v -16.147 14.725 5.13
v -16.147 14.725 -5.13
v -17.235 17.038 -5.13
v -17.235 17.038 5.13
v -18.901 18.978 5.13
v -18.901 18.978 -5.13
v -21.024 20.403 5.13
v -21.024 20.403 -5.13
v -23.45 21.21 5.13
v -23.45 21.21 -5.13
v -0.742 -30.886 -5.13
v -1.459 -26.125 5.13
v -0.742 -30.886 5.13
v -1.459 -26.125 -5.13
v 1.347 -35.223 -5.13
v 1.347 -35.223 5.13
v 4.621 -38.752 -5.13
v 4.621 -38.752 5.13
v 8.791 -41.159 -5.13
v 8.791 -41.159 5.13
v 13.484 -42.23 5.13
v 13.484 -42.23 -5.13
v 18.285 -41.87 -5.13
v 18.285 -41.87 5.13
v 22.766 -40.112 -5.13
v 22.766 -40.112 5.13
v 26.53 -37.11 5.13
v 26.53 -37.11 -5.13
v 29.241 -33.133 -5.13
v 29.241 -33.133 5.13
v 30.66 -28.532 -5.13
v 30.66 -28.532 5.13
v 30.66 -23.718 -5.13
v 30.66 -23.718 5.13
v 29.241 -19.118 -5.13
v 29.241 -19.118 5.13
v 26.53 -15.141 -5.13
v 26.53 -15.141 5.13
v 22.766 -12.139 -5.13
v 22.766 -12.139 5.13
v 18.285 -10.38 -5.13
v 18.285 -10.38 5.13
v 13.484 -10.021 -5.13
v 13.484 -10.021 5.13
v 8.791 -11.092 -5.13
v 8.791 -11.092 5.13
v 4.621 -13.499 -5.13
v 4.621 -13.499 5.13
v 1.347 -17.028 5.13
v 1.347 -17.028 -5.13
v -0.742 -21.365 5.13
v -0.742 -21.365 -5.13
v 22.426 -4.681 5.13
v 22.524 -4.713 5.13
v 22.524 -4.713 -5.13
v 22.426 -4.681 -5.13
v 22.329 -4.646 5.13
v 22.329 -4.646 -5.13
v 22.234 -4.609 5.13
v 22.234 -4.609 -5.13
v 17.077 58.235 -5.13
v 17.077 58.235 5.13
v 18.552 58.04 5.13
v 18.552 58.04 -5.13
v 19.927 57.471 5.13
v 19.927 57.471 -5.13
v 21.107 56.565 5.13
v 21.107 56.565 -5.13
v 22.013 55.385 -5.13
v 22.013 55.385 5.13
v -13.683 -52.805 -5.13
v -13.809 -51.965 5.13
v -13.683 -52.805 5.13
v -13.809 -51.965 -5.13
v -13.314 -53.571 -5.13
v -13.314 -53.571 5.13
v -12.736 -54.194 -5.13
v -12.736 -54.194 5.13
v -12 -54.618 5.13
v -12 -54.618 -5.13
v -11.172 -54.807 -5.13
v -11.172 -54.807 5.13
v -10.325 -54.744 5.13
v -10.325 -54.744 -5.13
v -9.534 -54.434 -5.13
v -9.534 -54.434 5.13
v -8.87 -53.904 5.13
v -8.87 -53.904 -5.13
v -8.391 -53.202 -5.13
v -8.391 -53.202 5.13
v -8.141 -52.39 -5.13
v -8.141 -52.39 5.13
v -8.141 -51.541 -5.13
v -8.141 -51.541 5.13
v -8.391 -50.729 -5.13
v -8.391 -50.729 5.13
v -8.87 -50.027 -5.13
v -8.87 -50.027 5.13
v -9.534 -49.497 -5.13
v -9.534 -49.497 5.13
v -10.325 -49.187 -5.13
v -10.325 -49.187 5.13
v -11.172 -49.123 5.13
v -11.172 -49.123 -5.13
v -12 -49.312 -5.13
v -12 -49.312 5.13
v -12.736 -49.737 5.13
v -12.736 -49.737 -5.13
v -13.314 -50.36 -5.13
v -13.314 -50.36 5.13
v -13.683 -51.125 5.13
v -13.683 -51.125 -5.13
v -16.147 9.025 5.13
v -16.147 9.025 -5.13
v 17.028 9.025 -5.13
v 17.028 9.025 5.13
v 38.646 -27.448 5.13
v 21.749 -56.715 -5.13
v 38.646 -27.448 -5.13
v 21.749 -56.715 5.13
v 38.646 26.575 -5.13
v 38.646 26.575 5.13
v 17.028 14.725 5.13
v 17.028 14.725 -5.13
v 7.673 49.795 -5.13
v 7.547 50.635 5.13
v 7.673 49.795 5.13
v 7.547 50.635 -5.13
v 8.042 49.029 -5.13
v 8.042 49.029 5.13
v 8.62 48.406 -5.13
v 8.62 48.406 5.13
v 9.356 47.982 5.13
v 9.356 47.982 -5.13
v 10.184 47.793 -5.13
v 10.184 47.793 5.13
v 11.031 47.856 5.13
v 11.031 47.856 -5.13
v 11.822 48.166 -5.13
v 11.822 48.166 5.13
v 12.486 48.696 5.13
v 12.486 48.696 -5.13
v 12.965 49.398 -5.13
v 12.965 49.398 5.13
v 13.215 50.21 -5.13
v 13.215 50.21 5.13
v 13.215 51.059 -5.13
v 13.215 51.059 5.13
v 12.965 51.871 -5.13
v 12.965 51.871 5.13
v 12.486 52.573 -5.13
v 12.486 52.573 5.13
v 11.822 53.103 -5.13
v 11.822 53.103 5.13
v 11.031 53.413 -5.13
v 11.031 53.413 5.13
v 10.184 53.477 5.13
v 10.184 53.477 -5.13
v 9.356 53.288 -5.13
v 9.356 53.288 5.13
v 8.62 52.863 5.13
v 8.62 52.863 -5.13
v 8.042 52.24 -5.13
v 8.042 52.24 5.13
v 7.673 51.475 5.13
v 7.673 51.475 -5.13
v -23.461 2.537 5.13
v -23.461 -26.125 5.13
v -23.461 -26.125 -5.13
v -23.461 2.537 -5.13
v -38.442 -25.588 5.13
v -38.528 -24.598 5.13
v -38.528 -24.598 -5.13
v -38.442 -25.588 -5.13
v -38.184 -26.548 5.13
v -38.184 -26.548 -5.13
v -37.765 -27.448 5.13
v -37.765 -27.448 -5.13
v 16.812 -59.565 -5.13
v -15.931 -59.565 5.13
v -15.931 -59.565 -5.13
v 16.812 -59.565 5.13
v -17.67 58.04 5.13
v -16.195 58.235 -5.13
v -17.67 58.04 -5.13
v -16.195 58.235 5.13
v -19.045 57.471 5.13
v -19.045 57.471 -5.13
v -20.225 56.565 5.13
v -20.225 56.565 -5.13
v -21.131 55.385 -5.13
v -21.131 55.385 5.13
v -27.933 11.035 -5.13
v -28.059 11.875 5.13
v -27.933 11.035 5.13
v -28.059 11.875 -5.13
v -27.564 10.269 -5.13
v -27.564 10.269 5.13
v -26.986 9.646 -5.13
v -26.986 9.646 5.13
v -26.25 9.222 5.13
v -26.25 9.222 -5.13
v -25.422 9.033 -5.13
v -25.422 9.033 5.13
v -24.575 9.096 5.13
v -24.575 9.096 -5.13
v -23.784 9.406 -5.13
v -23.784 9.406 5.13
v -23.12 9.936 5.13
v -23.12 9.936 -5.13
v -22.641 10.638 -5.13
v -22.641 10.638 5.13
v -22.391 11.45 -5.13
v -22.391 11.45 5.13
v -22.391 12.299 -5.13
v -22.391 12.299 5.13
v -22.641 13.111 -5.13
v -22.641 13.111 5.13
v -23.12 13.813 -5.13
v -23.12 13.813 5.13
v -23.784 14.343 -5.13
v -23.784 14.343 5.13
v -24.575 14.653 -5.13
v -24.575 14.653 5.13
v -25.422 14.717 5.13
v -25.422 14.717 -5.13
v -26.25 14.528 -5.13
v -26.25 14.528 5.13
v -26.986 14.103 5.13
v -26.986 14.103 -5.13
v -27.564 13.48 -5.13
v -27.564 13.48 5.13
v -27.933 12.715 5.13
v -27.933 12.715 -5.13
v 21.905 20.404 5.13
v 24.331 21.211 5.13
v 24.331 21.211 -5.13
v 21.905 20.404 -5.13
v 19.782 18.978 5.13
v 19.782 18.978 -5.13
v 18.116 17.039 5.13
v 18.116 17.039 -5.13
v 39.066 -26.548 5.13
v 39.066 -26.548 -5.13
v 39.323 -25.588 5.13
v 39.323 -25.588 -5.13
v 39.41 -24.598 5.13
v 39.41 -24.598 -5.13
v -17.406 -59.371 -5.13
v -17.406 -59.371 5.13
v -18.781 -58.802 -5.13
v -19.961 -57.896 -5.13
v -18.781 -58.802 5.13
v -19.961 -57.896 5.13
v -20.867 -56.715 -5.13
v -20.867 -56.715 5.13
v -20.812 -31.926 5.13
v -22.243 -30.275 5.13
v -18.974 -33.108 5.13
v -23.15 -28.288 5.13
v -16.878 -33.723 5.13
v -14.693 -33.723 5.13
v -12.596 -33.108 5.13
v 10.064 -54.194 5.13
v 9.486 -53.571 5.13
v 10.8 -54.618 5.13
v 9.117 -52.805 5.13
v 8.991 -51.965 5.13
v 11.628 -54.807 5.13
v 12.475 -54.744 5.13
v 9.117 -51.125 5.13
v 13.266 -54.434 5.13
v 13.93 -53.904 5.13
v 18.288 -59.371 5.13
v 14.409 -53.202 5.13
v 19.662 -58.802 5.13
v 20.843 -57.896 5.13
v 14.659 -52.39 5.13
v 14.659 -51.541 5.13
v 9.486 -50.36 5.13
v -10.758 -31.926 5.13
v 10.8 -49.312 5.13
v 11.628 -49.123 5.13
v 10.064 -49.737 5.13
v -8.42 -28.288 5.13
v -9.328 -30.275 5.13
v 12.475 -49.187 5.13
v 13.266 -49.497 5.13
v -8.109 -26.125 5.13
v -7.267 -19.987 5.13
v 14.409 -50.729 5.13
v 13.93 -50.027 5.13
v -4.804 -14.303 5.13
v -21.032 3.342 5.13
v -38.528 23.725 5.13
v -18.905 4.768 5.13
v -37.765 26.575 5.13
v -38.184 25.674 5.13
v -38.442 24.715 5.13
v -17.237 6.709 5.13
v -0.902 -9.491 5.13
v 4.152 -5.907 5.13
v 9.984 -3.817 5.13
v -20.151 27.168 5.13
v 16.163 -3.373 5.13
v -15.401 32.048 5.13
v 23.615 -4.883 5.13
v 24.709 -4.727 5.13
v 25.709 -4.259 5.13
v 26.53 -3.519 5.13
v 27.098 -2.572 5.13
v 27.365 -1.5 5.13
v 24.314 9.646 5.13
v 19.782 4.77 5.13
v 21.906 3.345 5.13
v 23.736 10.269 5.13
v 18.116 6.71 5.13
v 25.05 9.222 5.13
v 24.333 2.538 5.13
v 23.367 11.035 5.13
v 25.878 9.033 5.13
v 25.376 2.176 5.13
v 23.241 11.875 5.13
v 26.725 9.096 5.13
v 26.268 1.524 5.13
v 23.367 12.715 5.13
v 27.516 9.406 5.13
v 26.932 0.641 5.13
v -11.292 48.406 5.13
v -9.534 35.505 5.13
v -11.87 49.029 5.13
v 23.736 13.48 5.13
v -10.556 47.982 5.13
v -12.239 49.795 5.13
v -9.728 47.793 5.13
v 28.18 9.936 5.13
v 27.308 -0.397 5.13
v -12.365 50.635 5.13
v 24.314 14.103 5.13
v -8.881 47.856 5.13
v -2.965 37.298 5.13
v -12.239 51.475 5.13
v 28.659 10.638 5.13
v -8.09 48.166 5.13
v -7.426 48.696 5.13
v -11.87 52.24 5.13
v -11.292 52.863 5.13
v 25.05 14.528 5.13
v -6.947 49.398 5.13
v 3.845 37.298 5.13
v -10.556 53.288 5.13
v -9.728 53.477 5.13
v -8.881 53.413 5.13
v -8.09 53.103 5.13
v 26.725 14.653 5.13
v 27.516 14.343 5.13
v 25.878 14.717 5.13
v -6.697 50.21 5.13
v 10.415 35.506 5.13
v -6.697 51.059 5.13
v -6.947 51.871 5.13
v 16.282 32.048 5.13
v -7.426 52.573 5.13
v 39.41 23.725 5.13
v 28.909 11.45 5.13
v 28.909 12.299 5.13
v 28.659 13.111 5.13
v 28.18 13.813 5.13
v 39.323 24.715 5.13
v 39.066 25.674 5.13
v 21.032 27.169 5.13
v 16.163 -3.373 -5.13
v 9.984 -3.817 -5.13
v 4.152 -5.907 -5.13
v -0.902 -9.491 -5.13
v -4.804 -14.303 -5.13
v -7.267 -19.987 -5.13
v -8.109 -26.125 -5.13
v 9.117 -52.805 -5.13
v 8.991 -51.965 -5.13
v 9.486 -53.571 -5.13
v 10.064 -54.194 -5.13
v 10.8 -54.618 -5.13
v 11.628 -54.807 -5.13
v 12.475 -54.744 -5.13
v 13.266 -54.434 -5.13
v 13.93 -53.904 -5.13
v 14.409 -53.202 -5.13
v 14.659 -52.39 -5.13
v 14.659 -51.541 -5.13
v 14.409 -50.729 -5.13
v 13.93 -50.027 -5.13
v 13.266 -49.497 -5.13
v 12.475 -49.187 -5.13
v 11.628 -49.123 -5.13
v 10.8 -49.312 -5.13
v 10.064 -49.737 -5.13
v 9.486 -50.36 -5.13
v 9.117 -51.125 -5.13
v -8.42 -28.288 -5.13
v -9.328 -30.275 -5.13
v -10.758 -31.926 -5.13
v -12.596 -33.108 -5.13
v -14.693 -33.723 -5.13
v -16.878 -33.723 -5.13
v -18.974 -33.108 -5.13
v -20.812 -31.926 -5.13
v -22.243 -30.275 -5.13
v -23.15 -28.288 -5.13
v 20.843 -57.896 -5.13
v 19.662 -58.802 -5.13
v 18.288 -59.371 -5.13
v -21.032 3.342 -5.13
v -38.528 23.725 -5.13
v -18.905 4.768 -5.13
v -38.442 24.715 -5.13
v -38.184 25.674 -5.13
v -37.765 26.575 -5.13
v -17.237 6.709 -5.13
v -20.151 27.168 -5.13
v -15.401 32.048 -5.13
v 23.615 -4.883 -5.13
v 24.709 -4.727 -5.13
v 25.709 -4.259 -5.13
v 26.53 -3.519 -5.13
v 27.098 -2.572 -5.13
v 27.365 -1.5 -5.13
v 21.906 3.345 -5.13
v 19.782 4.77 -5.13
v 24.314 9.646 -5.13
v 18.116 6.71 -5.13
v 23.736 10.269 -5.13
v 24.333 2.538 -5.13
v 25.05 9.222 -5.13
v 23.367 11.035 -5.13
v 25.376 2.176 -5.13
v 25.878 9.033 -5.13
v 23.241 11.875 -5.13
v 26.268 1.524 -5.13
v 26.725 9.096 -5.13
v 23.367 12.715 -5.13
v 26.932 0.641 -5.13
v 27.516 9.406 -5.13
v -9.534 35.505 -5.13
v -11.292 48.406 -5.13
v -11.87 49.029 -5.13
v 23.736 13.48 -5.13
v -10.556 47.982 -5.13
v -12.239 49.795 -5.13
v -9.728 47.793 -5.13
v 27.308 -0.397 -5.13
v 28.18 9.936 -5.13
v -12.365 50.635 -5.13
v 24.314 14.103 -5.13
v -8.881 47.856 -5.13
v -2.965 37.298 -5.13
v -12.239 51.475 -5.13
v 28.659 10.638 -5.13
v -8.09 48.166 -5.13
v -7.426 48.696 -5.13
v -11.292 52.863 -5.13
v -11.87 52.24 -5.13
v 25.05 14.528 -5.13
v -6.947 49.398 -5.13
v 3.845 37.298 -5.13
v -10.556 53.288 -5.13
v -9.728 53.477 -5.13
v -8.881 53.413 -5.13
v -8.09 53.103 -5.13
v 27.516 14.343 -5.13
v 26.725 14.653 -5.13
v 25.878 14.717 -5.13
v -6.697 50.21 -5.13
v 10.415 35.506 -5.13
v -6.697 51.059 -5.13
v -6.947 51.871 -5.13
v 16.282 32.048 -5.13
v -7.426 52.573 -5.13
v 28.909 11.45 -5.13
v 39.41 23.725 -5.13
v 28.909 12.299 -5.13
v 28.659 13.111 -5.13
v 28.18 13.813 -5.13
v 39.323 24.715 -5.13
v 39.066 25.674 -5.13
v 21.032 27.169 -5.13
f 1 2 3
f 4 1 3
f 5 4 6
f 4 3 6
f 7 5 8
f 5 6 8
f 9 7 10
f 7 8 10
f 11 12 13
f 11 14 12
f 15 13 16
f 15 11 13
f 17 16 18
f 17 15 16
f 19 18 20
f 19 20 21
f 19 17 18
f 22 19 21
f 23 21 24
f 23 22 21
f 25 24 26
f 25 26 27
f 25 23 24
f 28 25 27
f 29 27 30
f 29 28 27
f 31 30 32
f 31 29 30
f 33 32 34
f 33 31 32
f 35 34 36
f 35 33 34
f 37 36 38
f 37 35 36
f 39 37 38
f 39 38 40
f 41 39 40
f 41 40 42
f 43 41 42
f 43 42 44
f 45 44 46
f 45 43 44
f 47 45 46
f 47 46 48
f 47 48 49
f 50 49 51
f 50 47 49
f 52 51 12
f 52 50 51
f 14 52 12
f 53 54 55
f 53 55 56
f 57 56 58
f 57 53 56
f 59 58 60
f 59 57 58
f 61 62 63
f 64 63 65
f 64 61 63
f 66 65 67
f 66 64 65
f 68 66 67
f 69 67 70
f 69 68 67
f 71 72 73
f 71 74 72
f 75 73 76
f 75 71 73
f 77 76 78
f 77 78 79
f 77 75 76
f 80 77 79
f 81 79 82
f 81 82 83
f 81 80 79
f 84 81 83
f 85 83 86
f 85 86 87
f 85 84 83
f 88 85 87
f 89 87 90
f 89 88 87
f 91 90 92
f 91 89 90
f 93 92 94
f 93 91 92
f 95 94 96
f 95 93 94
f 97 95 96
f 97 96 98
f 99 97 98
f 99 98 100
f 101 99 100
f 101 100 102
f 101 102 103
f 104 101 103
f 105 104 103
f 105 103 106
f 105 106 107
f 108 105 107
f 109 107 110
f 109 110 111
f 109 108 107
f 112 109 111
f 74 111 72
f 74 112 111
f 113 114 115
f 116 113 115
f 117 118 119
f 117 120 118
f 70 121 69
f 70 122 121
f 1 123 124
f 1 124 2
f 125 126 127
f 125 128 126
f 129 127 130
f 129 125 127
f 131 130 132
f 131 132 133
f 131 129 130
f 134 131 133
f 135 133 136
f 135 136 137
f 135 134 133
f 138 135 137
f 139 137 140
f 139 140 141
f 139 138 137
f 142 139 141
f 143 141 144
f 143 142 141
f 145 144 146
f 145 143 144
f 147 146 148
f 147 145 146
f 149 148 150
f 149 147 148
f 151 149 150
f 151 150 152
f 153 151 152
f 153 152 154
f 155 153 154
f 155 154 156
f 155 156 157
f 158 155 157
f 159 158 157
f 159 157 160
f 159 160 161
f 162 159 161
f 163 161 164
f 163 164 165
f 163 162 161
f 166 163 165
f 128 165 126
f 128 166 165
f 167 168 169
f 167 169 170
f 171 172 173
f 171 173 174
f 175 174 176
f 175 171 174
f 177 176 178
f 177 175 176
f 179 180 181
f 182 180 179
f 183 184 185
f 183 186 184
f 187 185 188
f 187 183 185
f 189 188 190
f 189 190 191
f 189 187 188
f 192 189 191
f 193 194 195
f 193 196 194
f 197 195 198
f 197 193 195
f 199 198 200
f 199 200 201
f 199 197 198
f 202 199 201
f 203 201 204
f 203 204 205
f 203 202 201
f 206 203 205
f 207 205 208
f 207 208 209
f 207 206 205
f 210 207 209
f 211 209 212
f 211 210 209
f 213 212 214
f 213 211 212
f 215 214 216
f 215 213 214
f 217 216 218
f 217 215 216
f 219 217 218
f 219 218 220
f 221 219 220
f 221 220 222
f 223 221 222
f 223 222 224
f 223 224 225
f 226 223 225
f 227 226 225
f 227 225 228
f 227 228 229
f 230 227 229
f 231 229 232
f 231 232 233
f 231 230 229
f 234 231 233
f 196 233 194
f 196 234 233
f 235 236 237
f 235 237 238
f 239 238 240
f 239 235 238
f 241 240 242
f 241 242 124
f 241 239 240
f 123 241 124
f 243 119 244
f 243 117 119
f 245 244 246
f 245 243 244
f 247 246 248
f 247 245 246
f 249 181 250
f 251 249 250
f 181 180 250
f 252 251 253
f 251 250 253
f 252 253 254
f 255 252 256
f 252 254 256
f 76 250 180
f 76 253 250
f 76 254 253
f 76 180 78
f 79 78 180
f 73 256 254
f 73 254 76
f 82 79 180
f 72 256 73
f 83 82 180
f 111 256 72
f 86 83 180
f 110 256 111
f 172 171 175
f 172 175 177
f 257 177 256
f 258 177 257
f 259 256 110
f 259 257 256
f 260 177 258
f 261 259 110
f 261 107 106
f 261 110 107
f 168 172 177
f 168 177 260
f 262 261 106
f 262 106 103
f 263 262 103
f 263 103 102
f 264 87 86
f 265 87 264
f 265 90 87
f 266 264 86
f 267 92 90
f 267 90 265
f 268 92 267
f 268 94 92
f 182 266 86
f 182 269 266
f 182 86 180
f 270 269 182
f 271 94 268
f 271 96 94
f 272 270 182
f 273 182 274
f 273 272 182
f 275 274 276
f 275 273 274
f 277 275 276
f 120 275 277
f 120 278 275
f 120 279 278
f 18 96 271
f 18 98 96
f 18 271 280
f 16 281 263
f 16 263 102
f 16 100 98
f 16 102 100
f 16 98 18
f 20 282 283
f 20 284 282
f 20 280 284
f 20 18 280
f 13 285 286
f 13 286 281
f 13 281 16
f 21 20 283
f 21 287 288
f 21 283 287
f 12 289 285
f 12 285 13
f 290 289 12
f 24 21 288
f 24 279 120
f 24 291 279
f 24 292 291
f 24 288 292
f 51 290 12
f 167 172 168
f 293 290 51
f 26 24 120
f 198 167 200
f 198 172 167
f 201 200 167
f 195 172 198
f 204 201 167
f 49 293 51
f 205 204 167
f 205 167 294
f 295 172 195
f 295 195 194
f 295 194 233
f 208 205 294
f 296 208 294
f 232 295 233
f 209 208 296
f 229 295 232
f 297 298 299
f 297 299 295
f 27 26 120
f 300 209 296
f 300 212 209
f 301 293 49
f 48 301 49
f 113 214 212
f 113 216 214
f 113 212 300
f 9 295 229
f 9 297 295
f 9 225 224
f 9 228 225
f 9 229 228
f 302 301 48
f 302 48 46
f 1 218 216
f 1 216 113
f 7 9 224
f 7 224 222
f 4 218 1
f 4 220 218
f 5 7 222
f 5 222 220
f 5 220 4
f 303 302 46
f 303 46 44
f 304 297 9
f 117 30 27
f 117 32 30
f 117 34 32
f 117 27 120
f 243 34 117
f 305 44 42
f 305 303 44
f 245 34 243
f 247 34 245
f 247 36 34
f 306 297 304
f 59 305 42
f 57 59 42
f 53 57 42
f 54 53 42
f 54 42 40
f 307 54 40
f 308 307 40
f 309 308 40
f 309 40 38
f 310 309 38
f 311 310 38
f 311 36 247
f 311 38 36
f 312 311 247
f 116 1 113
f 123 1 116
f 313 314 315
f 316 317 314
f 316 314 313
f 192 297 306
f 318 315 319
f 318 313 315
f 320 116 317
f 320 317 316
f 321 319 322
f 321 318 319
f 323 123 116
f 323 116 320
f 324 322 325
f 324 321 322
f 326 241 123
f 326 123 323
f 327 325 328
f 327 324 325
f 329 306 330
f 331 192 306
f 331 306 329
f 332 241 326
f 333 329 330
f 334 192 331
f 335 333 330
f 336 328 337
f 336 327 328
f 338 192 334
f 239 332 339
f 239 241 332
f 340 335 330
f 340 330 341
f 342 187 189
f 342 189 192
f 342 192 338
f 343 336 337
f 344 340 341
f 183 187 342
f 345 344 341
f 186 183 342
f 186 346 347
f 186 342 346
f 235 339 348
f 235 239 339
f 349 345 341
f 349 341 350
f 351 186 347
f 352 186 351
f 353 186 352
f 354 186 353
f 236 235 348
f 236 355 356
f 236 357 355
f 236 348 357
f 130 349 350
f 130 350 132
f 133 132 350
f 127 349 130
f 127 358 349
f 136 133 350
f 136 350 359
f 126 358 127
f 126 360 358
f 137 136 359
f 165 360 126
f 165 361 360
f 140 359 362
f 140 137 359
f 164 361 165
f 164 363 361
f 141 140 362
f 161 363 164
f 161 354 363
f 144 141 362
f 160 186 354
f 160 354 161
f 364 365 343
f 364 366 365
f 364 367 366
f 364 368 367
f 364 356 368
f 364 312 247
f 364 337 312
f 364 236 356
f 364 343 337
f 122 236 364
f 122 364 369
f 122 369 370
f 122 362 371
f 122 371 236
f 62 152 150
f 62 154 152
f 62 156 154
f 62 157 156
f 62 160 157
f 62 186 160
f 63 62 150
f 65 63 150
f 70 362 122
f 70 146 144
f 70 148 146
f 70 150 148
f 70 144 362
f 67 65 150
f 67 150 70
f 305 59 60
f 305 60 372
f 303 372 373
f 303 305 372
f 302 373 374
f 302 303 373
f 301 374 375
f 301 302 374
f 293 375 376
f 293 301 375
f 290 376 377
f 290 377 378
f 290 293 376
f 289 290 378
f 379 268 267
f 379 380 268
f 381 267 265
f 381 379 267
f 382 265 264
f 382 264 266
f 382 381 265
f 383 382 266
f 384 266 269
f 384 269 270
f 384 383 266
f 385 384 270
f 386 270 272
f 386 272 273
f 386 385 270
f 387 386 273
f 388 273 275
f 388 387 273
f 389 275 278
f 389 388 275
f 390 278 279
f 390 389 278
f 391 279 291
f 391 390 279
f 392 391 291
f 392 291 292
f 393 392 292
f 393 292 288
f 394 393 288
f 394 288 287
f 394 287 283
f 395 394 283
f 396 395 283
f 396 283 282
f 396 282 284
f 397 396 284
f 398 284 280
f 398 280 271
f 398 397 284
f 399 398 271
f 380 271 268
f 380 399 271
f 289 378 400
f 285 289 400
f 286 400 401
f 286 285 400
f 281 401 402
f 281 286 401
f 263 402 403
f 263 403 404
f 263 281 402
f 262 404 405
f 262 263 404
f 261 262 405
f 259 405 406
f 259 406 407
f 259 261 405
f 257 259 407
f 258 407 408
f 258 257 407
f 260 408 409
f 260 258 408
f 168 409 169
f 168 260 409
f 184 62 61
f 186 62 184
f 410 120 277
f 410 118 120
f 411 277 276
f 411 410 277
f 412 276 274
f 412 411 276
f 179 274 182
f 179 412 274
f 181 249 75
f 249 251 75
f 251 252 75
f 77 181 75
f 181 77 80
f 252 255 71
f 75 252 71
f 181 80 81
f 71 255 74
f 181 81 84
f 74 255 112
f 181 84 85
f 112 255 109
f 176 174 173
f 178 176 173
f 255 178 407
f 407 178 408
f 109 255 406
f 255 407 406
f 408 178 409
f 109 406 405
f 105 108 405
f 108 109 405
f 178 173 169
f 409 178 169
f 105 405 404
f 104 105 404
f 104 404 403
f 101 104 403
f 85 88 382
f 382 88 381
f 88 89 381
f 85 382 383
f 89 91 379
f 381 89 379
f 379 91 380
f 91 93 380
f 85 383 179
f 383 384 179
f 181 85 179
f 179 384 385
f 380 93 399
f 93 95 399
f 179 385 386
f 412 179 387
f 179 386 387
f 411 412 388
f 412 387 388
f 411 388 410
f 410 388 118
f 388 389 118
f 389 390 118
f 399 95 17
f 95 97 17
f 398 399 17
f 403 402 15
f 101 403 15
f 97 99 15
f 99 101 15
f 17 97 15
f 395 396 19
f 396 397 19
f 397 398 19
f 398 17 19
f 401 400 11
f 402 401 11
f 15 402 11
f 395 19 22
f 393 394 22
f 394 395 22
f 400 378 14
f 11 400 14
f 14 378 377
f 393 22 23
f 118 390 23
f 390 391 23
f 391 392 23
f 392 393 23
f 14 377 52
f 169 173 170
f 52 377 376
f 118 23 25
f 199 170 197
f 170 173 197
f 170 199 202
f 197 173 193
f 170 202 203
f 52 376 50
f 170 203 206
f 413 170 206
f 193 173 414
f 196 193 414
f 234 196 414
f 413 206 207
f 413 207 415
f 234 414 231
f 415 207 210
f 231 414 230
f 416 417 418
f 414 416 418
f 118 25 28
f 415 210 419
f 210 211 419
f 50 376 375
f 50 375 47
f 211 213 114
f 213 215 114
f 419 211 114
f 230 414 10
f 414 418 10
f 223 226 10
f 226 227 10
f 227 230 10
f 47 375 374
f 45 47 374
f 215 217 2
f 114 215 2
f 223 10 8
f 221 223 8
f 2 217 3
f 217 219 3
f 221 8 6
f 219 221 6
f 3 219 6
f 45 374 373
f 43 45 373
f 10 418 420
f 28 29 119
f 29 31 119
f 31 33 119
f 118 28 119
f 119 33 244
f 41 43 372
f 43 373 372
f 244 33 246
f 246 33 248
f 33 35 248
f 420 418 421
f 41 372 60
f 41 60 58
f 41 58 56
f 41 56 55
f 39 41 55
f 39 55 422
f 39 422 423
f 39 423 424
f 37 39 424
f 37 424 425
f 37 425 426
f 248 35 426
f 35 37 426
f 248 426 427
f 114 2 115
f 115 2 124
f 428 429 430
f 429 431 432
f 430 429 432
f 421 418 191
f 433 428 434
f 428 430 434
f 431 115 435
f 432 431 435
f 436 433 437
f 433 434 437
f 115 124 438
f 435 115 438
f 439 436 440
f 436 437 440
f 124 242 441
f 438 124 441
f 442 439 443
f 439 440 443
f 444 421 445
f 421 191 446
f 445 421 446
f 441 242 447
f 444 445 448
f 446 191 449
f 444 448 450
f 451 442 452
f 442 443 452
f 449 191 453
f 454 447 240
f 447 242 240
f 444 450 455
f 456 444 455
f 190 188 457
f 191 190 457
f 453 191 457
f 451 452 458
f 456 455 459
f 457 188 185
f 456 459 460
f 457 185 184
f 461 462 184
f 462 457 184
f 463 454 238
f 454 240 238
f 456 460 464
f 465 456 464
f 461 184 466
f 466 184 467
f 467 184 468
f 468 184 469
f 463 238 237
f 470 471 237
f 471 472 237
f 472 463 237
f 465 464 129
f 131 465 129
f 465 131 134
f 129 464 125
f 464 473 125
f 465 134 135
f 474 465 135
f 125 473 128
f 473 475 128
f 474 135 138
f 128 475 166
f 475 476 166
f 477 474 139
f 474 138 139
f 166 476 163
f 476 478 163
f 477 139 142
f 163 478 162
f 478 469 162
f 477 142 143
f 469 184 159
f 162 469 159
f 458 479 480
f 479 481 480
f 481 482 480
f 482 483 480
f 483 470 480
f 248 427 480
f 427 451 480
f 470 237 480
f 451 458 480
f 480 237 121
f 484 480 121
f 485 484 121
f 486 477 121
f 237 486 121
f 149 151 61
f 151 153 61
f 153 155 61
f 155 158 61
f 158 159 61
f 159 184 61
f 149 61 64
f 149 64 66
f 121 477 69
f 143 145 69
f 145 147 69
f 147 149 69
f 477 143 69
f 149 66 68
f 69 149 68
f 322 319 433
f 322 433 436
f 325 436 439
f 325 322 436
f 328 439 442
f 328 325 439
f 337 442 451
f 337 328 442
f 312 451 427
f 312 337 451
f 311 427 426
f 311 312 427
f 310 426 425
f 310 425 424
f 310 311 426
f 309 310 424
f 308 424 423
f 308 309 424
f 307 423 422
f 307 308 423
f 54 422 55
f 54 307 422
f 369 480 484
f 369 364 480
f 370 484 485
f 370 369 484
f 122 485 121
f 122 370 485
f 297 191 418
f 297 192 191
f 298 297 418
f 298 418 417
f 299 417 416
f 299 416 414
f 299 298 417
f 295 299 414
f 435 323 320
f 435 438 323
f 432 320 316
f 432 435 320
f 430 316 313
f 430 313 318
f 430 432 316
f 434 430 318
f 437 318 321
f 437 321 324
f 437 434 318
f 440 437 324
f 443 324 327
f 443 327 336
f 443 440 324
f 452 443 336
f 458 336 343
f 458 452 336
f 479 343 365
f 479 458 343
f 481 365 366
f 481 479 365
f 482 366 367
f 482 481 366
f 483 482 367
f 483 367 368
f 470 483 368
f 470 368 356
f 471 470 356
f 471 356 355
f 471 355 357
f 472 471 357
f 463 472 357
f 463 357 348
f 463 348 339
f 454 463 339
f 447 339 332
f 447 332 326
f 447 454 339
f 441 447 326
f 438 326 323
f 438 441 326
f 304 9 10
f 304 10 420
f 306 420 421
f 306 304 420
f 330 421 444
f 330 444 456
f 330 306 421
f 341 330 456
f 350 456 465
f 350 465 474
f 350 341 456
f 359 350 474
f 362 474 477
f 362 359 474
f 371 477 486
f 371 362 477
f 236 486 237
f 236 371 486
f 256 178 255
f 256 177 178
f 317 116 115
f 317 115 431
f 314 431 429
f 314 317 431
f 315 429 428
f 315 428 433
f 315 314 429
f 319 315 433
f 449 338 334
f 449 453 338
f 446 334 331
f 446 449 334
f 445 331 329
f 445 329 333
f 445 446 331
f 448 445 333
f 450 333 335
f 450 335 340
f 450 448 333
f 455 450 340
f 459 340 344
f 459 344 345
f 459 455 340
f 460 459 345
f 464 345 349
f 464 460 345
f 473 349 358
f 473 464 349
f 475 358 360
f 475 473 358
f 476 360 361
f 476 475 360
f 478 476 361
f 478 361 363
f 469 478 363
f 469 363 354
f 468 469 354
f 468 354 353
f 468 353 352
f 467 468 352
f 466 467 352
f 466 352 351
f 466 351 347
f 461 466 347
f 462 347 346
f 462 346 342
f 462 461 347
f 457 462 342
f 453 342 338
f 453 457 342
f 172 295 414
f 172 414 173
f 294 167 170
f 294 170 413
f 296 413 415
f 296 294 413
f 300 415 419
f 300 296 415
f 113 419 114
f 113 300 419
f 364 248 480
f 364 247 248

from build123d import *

# Parameters (mm, degrees)
SKETCH1_R           = 1.5
SKETCH1_R_2         = 8.5
BOSS_EXTRUDE1_DEPTH = 2.7
FILLET1_R           = 3
SCALE1_SCALE        = 1.9


with BuildPart() as part:
    # Sketch1 → Boss-Extrude1 (new, symmetric)
    with BuildSketch(Plane.XY):
        with BuildLine():
            Line((10.487675588, 31), (-10.487675588, 31))
            Line((-10.487675588, 31), (-20.108076211, 14.336977332))
            ThreePointArc((-20.108076211, 14.336977332), (-20.407777479, 13.613434467), (-20.51, 12.836977332))
            Line((-20.51, 12.836977332), (-20.51, -12.596152423))
            ThreePointArc((-20.51, -12.596152423), (-20.407777479, -13.372609558), (-20.108076211, -14.096152423))
            Line((-20.108076211, -14.096152423), (-10.348635262, -31))
            Line((-10.348635262, -31), (10.348635262, -31))
            Line((10.348635262, -31), (20.108076211, -14.096152423))
            ThreePointArc((20.108076211, -14.096152423), (20.407777479, -13.372609558), (20.51, -12.596152423))
            Line((20.51, -12.596152423), (20.51, 12.836977332))
            ThreePointArc((20.51, 12.836977332), (20.407777479, 13.613434467), (20.108076211, 14.336977332))
            Line((20.108076211, 14.336977332), (10.487675588, 31))
        make_face()
        with Locations(Location((-6, -27, 0), (0, 0, 180))):
            Circle(SKETCH1_R, mode=Mode.SUBTRACT)
        with Locations(Location((6, -27, 0), (0, 0, 180))):
            Circle(SKETCH1_R, mode=Mode.SUBTRACT)
        with Locations(Location((7.5, -13.4, 0), (0, 0, 180))):
            Circle(SKETCH1_R_2, mode=Mode.SUBTRACT)
        with BuildLine():
            ThreePointArc((-4.5, -13.4), (-8.54, -17.44), (-12.58, -13.4))
            Line((-12.58, -13.4), (-12.58, 1.685368783))
            ThreePointArc((-12.58, 1.685368783), (-10.18215631, 2.859423407), (-8.730303993, 5.1))
            Line((-8.730303993, 5.1), (8.729875369, 5.1))
            ThreePointArc((8.729875369, 5.1), (10.179804764, 2.860963681), (12.574584064, 1.685969643))
            ThreePointArc((12.574584064, 1.685969643), (14.121431526, -0.726790857), (11.622623122, -2.13039581))
            ThreePointArc((11.622623122, -2.13039581), (11.545720037, -2.104624526), (11.469942926, -2.075709596))
            ThreePointArc((11.469942926, -2.075709596), (0.558793877, -3.611248417), (-4.5, -13.4))
        make_face(mode=Mode.SUBTRACT)
        with Locations(Location((-13.5, 6.6, 0), (0, 0, 180))):
            Circle(SKETCH1_R, mode=Mode.SUBTRACT)
        with BuildLine():
            Line((8.729875369, 8.1), (-8.730303993, 8.1))
            ThreePointArc((-8.730303993, 8.1), (-10.179901517, 10.338575405), (-12.574074074, 11.513518208))
            ThreePointArc((-12.574074074, 11.513518208), (-0.00020804, 20.099999998), (12.57392263, 11.513905748))
            ThreePointArc((12.57392263, 11.513905748), (10.179553129, 10.338812856), (8.729875369, 8.1))
        make_face(mode=Mode.SUBTRACT)
        with Locations(Location((-5.24, 27, 0), (0, 0, 180))):
            Circle(SKETCH1_R, mode=Mode.SUBTRACT)
        with Locations(Location((13.5, 6.6, 0), (0, 0, 180))):
            Circle(SKETCH1_R, mode=Mode.SUBTRACT)
        with Locations(Location((5.24, 27, 0), (0, 0, 180))):
            Circle(SKETCH1_R, mode=Mode.SUBTRACT)
    extrude(amount=BOSS_EXTRUDE1_DEPTH, both=True)

    # Fillet1
    fillet1_edges = [part.edges().sort_by_distance(p)[0] for p in [
        (-10.487675588, 31, 0),
        (10.487675588, 31, 0),
        (10.348635262, -31, 0),
        (-10.348635262, -31, 0),
    ]]
    fillet(fillet1_edges, radius=FILLET1_R)


with BuildPart() as part_1:
    # Scale1: scaled about (-0.489793852, 0.73928426, 0)
    add(part.part.scale(SCALE1_SCALE).moved(Location((0.440814467, -0.665355834, 0))))


solid = part_1.part
